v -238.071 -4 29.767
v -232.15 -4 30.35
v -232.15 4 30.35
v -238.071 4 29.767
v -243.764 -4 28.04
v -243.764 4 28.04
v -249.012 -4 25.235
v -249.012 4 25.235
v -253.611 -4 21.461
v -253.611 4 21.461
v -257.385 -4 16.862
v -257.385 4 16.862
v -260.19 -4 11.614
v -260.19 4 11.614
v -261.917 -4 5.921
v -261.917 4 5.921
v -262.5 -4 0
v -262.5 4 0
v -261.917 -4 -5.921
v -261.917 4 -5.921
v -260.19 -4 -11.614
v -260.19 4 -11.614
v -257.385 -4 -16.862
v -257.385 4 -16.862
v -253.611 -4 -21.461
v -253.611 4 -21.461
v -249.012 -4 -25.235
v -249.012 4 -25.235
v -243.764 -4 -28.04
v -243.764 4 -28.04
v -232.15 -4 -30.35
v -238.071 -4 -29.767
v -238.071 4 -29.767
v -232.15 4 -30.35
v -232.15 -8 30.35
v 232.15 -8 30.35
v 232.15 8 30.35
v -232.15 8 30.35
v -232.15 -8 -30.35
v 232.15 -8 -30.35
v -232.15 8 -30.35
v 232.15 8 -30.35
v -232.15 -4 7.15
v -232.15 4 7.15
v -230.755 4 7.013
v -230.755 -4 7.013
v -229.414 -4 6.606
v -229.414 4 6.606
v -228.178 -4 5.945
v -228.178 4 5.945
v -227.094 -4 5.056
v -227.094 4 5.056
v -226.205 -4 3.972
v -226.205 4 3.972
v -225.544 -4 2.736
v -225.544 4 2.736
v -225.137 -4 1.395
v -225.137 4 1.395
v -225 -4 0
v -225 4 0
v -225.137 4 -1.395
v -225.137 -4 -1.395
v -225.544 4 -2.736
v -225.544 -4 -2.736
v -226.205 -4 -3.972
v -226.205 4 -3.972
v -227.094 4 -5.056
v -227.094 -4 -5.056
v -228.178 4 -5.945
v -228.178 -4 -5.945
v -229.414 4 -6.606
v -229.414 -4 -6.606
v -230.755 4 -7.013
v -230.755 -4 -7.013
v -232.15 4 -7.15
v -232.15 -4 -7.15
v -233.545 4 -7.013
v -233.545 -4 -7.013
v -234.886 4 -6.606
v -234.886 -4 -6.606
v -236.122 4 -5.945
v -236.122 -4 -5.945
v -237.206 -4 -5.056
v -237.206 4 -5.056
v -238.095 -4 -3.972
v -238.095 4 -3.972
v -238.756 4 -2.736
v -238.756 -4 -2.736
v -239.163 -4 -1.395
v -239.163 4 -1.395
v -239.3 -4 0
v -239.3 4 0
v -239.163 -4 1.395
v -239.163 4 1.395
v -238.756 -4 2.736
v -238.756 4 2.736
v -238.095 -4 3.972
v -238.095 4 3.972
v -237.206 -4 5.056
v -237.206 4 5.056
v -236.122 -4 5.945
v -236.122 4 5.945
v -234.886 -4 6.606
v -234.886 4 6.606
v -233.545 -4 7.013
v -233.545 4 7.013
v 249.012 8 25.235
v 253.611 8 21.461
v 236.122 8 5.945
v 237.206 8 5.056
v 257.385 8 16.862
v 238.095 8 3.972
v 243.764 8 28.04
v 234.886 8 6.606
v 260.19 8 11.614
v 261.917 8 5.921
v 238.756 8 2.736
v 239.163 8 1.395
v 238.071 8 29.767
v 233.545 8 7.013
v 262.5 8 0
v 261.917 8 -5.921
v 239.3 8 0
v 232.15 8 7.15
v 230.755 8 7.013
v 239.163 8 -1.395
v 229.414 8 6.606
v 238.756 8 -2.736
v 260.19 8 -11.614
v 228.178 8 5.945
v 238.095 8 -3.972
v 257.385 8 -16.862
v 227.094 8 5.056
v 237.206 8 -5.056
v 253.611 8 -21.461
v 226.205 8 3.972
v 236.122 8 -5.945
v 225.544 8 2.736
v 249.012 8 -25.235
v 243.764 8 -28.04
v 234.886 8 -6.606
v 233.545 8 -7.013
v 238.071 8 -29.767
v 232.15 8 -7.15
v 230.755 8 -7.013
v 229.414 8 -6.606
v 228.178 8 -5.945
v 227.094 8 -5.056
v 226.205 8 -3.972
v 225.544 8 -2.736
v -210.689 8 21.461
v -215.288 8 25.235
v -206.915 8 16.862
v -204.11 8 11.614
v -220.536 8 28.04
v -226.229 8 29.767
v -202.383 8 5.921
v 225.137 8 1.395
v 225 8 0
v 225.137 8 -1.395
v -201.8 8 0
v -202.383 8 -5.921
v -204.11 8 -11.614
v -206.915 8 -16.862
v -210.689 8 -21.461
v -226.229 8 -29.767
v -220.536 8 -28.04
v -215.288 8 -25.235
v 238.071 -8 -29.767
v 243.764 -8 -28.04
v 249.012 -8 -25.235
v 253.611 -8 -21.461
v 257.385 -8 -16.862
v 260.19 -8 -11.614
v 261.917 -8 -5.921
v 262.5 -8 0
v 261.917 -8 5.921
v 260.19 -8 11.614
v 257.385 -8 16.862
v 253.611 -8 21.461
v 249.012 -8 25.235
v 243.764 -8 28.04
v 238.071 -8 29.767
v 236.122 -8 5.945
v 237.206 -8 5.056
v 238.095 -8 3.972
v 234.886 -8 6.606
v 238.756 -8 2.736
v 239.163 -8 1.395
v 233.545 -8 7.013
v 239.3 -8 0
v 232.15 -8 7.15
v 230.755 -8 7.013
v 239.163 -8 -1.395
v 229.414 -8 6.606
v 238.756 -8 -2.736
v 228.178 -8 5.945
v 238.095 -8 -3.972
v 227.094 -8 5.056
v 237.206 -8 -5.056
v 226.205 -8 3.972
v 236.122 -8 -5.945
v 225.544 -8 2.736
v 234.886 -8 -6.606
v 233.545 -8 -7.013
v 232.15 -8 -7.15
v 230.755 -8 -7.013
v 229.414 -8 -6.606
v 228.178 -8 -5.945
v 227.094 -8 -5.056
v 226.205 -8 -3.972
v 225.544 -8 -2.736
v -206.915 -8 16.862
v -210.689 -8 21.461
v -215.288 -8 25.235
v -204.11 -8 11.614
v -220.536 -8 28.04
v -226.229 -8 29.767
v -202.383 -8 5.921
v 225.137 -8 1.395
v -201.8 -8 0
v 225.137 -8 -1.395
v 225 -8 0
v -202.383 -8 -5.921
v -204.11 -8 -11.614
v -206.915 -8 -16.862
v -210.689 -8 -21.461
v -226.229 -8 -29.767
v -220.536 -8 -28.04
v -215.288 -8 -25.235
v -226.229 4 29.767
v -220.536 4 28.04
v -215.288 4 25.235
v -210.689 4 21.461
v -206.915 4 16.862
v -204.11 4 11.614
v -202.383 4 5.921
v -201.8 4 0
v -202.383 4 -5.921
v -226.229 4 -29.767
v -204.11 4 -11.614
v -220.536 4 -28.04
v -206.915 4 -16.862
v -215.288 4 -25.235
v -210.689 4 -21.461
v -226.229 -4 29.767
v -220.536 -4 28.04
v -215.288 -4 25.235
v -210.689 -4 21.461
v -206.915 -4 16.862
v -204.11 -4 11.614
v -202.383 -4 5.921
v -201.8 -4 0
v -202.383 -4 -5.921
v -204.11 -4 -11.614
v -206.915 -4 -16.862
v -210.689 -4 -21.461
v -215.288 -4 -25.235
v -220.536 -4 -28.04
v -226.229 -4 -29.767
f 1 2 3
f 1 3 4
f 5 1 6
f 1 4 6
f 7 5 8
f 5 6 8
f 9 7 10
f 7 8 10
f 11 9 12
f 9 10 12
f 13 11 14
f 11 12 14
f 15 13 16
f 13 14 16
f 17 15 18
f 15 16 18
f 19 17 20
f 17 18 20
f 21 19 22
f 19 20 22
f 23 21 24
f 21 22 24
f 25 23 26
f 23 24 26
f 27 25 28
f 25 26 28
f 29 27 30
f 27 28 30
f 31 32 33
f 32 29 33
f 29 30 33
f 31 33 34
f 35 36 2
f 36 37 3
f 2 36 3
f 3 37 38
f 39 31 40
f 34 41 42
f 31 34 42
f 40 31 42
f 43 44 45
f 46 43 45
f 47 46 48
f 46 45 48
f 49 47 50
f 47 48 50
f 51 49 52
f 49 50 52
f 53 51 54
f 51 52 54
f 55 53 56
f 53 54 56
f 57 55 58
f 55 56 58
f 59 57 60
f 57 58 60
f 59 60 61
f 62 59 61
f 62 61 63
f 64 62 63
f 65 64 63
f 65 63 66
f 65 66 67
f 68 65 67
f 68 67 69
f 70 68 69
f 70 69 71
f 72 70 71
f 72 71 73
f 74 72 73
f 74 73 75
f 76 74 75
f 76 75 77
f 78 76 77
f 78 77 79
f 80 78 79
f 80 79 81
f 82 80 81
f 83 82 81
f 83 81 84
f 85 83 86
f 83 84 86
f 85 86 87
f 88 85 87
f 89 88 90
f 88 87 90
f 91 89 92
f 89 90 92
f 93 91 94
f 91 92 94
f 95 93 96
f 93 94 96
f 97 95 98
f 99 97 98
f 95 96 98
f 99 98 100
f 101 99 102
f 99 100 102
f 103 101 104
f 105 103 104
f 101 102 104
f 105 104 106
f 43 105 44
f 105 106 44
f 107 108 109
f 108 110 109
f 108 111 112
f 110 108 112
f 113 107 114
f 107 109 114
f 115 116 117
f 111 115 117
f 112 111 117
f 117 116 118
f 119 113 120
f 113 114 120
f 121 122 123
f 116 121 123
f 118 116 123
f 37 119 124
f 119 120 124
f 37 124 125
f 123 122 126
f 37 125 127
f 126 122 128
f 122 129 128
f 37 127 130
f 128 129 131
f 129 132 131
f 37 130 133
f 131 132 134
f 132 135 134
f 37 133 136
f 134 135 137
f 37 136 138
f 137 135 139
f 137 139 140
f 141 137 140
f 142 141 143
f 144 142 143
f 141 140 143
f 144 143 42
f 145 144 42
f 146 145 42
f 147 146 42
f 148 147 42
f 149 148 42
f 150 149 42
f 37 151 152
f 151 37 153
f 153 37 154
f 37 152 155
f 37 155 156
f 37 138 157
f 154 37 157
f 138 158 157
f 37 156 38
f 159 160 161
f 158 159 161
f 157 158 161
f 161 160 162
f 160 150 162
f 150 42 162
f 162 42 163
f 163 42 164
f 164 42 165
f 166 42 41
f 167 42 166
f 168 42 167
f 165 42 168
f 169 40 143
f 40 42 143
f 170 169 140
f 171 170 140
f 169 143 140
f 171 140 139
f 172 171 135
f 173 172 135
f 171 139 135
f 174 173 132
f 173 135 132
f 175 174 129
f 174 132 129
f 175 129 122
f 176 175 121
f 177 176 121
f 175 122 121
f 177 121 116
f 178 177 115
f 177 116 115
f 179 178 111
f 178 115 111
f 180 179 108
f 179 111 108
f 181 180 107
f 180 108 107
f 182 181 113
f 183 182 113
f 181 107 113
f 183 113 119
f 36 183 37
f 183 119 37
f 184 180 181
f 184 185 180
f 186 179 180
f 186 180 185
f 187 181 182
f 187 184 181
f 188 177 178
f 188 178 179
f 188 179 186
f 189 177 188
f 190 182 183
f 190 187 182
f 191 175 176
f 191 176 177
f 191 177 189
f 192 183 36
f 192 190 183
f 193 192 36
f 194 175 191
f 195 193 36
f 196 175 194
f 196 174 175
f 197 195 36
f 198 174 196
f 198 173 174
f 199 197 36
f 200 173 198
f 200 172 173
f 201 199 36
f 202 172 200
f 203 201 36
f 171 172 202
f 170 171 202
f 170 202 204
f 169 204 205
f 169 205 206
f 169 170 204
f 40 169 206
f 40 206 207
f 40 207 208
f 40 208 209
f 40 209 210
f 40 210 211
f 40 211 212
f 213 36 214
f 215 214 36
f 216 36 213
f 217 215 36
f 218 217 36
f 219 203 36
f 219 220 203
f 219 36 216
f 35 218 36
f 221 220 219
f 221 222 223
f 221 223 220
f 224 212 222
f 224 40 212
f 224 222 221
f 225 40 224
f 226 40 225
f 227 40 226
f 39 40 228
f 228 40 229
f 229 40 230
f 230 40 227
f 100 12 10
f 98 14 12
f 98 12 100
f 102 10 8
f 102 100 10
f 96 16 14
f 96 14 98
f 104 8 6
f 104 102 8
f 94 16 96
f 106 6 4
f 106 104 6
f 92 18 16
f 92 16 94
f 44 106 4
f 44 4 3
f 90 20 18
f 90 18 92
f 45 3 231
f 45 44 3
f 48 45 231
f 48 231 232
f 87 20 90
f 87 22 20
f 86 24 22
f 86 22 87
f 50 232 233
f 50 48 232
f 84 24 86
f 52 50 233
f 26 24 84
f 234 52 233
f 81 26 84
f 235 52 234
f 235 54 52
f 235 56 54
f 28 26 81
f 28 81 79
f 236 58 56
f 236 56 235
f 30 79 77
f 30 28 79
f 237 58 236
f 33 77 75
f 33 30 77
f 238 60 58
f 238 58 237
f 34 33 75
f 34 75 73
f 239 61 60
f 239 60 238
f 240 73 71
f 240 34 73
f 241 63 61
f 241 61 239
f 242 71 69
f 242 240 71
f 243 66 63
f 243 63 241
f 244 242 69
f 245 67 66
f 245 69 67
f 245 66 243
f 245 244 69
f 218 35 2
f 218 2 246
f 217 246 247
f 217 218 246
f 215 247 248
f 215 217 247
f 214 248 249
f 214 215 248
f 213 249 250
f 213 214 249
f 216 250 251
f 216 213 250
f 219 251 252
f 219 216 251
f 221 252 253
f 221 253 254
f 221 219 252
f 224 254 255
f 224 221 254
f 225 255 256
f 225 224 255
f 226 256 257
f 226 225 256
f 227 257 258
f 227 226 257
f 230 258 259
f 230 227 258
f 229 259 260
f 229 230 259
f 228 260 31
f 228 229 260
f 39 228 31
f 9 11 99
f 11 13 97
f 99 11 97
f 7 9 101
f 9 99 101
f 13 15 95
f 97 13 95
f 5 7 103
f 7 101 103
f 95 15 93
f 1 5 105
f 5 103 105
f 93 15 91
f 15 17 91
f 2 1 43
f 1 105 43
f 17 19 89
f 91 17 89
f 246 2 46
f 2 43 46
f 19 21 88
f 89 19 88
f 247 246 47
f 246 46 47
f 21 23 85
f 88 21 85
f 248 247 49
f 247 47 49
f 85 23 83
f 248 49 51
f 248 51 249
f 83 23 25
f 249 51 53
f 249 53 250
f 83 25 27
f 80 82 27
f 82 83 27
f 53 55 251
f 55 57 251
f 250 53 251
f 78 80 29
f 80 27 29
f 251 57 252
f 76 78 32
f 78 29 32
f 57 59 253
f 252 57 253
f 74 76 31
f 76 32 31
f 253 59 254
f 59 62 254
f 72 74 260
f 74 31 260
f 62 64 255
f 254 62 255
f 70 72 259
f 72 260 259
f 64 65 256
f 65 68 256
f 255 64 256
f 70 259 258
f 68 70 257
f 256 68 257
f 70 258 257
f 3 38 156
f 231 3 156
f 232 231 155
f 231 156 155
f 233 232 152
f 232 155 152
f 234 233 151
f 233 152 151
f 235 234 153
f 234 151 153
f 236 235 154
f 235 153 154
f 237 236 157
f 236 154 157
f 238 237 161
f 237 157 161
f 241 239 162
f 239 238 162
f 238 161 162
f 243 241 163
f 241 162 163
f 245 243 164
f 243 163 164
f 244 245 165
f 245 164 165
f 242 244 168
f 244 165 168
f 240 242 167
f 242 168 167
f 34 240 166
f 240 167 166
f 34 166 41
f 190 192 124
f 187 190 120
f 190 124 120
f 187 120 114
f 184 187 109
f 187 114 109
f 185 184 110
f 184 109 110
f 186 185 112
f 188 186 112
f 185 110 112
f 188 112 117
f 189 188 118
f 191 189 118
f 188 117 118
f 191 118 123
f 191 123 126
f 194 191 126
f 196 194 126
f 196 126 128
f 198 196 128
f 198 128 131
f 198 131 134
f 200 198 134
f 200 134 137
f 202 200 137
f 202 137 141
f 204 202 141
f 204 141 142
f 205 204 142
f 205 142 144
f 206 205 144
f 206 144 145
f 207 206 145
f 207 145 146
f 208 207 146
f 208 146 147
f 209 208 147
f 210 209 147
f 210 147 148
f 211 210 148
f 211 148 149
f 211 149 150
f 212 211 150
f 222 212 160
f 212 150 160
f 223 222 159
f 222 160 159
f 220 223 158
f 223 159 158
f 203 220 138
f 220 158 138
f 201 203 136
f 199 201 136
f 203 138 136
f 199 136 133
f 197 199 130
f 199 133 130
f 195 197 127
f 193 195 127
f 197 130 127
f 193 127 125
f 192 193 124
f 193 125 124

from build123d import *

# Parameters (mm, degrees)
BOSS_EXTRU_1_DEPTH      = 8
ESQUISSE2_R             = 7.15
ENL_V_MAT_EXTRU_1_DEPTH = 265.732643435
ESQUISSE3_R             = 30.35
ENL_V_MAT_EXTRU_4_DEPTH = 4
ESQUISSE4_R             = 7.15
ENL_V_MAT_EXTRU_5_DEPTH = 265.521024684


with BuildPart() as part:
    # Esquisse1 → Boss.-Extru.1 (new, symmetric)
    with BuildSketch(Plane(origin=(0, 0, 0), x_dir=(1, 0, 0), z_dir=(0, 1, 0))):
        with BuildLine():
            Line((-232.15, 30.35), (232.15, 30.35))
            ThreePointArc((232.15, 30.35), (262.5, 0), (232.15, -30.35))
            Line((232.15, -30.35), (-232.15, -30.35))
            ThreePointArc((-232.15, -30.35), (-262.5, 0), (-232.15, 30.35))
        make_face()
    extrude(amount=BOSS_EXTRU_1_DEPTH, both=True)

    # Esquisse2 → Enlèv. mat.-Extru.1 (cut, through all)
    with BuildSketch(Plane(origin=(0, 8, 0), x_dir=(1, 0, 0), z_dir=(0, 1, 0))):
        with Locations(Location((232.15, 0, 0), (0, 0, 270))):
            Circle(ESQUISSE2_R)
    extrude(amount=-ENL_V_MAT_EXTRU_1_DEPTH, mode=Mode.SUBTRACT)

    # Esquisse3 → Enlèv. mat.-Extru.4 (cut)
    with BuildSketch(Plane(origin=(0, 8, 0), x_dir=(1, 0, 0), z_dir=(0, 1, 0))):
        with Locations((-232.15, 0)):
            Circle(ESQUISSE3_R)
    enl_v_mat_extru_4 = extrude(amount=-ENL_V_MAT_EXTRU_4_DEPTH, mode=Mode.SUBTRACT)

    # Symétrie4: Enlèv. mat.-Extru.4 across plane
    add(enl_v_mat_extru_4.mirror(Plane.ZX), mode=Mode.SUBTRACT)

    # Esquisse4 → Enlèv. mat.-Extru.5 (cut, through all)
    with BuildSketch(Plane(origin=(0, 4, 0), x_dir=(1, 0, 0), z_dir=(0, 1, 0))):
        with Locations(Location((-232.15, 0, 0), (0, 0, 270))):
            Circle(ESQUISSE4_R)
    extrude(amount=-ENL_V_MAT_EXTRU_5_DEPTH, mode=Mode.SUBTRACT)


solid = part.part
